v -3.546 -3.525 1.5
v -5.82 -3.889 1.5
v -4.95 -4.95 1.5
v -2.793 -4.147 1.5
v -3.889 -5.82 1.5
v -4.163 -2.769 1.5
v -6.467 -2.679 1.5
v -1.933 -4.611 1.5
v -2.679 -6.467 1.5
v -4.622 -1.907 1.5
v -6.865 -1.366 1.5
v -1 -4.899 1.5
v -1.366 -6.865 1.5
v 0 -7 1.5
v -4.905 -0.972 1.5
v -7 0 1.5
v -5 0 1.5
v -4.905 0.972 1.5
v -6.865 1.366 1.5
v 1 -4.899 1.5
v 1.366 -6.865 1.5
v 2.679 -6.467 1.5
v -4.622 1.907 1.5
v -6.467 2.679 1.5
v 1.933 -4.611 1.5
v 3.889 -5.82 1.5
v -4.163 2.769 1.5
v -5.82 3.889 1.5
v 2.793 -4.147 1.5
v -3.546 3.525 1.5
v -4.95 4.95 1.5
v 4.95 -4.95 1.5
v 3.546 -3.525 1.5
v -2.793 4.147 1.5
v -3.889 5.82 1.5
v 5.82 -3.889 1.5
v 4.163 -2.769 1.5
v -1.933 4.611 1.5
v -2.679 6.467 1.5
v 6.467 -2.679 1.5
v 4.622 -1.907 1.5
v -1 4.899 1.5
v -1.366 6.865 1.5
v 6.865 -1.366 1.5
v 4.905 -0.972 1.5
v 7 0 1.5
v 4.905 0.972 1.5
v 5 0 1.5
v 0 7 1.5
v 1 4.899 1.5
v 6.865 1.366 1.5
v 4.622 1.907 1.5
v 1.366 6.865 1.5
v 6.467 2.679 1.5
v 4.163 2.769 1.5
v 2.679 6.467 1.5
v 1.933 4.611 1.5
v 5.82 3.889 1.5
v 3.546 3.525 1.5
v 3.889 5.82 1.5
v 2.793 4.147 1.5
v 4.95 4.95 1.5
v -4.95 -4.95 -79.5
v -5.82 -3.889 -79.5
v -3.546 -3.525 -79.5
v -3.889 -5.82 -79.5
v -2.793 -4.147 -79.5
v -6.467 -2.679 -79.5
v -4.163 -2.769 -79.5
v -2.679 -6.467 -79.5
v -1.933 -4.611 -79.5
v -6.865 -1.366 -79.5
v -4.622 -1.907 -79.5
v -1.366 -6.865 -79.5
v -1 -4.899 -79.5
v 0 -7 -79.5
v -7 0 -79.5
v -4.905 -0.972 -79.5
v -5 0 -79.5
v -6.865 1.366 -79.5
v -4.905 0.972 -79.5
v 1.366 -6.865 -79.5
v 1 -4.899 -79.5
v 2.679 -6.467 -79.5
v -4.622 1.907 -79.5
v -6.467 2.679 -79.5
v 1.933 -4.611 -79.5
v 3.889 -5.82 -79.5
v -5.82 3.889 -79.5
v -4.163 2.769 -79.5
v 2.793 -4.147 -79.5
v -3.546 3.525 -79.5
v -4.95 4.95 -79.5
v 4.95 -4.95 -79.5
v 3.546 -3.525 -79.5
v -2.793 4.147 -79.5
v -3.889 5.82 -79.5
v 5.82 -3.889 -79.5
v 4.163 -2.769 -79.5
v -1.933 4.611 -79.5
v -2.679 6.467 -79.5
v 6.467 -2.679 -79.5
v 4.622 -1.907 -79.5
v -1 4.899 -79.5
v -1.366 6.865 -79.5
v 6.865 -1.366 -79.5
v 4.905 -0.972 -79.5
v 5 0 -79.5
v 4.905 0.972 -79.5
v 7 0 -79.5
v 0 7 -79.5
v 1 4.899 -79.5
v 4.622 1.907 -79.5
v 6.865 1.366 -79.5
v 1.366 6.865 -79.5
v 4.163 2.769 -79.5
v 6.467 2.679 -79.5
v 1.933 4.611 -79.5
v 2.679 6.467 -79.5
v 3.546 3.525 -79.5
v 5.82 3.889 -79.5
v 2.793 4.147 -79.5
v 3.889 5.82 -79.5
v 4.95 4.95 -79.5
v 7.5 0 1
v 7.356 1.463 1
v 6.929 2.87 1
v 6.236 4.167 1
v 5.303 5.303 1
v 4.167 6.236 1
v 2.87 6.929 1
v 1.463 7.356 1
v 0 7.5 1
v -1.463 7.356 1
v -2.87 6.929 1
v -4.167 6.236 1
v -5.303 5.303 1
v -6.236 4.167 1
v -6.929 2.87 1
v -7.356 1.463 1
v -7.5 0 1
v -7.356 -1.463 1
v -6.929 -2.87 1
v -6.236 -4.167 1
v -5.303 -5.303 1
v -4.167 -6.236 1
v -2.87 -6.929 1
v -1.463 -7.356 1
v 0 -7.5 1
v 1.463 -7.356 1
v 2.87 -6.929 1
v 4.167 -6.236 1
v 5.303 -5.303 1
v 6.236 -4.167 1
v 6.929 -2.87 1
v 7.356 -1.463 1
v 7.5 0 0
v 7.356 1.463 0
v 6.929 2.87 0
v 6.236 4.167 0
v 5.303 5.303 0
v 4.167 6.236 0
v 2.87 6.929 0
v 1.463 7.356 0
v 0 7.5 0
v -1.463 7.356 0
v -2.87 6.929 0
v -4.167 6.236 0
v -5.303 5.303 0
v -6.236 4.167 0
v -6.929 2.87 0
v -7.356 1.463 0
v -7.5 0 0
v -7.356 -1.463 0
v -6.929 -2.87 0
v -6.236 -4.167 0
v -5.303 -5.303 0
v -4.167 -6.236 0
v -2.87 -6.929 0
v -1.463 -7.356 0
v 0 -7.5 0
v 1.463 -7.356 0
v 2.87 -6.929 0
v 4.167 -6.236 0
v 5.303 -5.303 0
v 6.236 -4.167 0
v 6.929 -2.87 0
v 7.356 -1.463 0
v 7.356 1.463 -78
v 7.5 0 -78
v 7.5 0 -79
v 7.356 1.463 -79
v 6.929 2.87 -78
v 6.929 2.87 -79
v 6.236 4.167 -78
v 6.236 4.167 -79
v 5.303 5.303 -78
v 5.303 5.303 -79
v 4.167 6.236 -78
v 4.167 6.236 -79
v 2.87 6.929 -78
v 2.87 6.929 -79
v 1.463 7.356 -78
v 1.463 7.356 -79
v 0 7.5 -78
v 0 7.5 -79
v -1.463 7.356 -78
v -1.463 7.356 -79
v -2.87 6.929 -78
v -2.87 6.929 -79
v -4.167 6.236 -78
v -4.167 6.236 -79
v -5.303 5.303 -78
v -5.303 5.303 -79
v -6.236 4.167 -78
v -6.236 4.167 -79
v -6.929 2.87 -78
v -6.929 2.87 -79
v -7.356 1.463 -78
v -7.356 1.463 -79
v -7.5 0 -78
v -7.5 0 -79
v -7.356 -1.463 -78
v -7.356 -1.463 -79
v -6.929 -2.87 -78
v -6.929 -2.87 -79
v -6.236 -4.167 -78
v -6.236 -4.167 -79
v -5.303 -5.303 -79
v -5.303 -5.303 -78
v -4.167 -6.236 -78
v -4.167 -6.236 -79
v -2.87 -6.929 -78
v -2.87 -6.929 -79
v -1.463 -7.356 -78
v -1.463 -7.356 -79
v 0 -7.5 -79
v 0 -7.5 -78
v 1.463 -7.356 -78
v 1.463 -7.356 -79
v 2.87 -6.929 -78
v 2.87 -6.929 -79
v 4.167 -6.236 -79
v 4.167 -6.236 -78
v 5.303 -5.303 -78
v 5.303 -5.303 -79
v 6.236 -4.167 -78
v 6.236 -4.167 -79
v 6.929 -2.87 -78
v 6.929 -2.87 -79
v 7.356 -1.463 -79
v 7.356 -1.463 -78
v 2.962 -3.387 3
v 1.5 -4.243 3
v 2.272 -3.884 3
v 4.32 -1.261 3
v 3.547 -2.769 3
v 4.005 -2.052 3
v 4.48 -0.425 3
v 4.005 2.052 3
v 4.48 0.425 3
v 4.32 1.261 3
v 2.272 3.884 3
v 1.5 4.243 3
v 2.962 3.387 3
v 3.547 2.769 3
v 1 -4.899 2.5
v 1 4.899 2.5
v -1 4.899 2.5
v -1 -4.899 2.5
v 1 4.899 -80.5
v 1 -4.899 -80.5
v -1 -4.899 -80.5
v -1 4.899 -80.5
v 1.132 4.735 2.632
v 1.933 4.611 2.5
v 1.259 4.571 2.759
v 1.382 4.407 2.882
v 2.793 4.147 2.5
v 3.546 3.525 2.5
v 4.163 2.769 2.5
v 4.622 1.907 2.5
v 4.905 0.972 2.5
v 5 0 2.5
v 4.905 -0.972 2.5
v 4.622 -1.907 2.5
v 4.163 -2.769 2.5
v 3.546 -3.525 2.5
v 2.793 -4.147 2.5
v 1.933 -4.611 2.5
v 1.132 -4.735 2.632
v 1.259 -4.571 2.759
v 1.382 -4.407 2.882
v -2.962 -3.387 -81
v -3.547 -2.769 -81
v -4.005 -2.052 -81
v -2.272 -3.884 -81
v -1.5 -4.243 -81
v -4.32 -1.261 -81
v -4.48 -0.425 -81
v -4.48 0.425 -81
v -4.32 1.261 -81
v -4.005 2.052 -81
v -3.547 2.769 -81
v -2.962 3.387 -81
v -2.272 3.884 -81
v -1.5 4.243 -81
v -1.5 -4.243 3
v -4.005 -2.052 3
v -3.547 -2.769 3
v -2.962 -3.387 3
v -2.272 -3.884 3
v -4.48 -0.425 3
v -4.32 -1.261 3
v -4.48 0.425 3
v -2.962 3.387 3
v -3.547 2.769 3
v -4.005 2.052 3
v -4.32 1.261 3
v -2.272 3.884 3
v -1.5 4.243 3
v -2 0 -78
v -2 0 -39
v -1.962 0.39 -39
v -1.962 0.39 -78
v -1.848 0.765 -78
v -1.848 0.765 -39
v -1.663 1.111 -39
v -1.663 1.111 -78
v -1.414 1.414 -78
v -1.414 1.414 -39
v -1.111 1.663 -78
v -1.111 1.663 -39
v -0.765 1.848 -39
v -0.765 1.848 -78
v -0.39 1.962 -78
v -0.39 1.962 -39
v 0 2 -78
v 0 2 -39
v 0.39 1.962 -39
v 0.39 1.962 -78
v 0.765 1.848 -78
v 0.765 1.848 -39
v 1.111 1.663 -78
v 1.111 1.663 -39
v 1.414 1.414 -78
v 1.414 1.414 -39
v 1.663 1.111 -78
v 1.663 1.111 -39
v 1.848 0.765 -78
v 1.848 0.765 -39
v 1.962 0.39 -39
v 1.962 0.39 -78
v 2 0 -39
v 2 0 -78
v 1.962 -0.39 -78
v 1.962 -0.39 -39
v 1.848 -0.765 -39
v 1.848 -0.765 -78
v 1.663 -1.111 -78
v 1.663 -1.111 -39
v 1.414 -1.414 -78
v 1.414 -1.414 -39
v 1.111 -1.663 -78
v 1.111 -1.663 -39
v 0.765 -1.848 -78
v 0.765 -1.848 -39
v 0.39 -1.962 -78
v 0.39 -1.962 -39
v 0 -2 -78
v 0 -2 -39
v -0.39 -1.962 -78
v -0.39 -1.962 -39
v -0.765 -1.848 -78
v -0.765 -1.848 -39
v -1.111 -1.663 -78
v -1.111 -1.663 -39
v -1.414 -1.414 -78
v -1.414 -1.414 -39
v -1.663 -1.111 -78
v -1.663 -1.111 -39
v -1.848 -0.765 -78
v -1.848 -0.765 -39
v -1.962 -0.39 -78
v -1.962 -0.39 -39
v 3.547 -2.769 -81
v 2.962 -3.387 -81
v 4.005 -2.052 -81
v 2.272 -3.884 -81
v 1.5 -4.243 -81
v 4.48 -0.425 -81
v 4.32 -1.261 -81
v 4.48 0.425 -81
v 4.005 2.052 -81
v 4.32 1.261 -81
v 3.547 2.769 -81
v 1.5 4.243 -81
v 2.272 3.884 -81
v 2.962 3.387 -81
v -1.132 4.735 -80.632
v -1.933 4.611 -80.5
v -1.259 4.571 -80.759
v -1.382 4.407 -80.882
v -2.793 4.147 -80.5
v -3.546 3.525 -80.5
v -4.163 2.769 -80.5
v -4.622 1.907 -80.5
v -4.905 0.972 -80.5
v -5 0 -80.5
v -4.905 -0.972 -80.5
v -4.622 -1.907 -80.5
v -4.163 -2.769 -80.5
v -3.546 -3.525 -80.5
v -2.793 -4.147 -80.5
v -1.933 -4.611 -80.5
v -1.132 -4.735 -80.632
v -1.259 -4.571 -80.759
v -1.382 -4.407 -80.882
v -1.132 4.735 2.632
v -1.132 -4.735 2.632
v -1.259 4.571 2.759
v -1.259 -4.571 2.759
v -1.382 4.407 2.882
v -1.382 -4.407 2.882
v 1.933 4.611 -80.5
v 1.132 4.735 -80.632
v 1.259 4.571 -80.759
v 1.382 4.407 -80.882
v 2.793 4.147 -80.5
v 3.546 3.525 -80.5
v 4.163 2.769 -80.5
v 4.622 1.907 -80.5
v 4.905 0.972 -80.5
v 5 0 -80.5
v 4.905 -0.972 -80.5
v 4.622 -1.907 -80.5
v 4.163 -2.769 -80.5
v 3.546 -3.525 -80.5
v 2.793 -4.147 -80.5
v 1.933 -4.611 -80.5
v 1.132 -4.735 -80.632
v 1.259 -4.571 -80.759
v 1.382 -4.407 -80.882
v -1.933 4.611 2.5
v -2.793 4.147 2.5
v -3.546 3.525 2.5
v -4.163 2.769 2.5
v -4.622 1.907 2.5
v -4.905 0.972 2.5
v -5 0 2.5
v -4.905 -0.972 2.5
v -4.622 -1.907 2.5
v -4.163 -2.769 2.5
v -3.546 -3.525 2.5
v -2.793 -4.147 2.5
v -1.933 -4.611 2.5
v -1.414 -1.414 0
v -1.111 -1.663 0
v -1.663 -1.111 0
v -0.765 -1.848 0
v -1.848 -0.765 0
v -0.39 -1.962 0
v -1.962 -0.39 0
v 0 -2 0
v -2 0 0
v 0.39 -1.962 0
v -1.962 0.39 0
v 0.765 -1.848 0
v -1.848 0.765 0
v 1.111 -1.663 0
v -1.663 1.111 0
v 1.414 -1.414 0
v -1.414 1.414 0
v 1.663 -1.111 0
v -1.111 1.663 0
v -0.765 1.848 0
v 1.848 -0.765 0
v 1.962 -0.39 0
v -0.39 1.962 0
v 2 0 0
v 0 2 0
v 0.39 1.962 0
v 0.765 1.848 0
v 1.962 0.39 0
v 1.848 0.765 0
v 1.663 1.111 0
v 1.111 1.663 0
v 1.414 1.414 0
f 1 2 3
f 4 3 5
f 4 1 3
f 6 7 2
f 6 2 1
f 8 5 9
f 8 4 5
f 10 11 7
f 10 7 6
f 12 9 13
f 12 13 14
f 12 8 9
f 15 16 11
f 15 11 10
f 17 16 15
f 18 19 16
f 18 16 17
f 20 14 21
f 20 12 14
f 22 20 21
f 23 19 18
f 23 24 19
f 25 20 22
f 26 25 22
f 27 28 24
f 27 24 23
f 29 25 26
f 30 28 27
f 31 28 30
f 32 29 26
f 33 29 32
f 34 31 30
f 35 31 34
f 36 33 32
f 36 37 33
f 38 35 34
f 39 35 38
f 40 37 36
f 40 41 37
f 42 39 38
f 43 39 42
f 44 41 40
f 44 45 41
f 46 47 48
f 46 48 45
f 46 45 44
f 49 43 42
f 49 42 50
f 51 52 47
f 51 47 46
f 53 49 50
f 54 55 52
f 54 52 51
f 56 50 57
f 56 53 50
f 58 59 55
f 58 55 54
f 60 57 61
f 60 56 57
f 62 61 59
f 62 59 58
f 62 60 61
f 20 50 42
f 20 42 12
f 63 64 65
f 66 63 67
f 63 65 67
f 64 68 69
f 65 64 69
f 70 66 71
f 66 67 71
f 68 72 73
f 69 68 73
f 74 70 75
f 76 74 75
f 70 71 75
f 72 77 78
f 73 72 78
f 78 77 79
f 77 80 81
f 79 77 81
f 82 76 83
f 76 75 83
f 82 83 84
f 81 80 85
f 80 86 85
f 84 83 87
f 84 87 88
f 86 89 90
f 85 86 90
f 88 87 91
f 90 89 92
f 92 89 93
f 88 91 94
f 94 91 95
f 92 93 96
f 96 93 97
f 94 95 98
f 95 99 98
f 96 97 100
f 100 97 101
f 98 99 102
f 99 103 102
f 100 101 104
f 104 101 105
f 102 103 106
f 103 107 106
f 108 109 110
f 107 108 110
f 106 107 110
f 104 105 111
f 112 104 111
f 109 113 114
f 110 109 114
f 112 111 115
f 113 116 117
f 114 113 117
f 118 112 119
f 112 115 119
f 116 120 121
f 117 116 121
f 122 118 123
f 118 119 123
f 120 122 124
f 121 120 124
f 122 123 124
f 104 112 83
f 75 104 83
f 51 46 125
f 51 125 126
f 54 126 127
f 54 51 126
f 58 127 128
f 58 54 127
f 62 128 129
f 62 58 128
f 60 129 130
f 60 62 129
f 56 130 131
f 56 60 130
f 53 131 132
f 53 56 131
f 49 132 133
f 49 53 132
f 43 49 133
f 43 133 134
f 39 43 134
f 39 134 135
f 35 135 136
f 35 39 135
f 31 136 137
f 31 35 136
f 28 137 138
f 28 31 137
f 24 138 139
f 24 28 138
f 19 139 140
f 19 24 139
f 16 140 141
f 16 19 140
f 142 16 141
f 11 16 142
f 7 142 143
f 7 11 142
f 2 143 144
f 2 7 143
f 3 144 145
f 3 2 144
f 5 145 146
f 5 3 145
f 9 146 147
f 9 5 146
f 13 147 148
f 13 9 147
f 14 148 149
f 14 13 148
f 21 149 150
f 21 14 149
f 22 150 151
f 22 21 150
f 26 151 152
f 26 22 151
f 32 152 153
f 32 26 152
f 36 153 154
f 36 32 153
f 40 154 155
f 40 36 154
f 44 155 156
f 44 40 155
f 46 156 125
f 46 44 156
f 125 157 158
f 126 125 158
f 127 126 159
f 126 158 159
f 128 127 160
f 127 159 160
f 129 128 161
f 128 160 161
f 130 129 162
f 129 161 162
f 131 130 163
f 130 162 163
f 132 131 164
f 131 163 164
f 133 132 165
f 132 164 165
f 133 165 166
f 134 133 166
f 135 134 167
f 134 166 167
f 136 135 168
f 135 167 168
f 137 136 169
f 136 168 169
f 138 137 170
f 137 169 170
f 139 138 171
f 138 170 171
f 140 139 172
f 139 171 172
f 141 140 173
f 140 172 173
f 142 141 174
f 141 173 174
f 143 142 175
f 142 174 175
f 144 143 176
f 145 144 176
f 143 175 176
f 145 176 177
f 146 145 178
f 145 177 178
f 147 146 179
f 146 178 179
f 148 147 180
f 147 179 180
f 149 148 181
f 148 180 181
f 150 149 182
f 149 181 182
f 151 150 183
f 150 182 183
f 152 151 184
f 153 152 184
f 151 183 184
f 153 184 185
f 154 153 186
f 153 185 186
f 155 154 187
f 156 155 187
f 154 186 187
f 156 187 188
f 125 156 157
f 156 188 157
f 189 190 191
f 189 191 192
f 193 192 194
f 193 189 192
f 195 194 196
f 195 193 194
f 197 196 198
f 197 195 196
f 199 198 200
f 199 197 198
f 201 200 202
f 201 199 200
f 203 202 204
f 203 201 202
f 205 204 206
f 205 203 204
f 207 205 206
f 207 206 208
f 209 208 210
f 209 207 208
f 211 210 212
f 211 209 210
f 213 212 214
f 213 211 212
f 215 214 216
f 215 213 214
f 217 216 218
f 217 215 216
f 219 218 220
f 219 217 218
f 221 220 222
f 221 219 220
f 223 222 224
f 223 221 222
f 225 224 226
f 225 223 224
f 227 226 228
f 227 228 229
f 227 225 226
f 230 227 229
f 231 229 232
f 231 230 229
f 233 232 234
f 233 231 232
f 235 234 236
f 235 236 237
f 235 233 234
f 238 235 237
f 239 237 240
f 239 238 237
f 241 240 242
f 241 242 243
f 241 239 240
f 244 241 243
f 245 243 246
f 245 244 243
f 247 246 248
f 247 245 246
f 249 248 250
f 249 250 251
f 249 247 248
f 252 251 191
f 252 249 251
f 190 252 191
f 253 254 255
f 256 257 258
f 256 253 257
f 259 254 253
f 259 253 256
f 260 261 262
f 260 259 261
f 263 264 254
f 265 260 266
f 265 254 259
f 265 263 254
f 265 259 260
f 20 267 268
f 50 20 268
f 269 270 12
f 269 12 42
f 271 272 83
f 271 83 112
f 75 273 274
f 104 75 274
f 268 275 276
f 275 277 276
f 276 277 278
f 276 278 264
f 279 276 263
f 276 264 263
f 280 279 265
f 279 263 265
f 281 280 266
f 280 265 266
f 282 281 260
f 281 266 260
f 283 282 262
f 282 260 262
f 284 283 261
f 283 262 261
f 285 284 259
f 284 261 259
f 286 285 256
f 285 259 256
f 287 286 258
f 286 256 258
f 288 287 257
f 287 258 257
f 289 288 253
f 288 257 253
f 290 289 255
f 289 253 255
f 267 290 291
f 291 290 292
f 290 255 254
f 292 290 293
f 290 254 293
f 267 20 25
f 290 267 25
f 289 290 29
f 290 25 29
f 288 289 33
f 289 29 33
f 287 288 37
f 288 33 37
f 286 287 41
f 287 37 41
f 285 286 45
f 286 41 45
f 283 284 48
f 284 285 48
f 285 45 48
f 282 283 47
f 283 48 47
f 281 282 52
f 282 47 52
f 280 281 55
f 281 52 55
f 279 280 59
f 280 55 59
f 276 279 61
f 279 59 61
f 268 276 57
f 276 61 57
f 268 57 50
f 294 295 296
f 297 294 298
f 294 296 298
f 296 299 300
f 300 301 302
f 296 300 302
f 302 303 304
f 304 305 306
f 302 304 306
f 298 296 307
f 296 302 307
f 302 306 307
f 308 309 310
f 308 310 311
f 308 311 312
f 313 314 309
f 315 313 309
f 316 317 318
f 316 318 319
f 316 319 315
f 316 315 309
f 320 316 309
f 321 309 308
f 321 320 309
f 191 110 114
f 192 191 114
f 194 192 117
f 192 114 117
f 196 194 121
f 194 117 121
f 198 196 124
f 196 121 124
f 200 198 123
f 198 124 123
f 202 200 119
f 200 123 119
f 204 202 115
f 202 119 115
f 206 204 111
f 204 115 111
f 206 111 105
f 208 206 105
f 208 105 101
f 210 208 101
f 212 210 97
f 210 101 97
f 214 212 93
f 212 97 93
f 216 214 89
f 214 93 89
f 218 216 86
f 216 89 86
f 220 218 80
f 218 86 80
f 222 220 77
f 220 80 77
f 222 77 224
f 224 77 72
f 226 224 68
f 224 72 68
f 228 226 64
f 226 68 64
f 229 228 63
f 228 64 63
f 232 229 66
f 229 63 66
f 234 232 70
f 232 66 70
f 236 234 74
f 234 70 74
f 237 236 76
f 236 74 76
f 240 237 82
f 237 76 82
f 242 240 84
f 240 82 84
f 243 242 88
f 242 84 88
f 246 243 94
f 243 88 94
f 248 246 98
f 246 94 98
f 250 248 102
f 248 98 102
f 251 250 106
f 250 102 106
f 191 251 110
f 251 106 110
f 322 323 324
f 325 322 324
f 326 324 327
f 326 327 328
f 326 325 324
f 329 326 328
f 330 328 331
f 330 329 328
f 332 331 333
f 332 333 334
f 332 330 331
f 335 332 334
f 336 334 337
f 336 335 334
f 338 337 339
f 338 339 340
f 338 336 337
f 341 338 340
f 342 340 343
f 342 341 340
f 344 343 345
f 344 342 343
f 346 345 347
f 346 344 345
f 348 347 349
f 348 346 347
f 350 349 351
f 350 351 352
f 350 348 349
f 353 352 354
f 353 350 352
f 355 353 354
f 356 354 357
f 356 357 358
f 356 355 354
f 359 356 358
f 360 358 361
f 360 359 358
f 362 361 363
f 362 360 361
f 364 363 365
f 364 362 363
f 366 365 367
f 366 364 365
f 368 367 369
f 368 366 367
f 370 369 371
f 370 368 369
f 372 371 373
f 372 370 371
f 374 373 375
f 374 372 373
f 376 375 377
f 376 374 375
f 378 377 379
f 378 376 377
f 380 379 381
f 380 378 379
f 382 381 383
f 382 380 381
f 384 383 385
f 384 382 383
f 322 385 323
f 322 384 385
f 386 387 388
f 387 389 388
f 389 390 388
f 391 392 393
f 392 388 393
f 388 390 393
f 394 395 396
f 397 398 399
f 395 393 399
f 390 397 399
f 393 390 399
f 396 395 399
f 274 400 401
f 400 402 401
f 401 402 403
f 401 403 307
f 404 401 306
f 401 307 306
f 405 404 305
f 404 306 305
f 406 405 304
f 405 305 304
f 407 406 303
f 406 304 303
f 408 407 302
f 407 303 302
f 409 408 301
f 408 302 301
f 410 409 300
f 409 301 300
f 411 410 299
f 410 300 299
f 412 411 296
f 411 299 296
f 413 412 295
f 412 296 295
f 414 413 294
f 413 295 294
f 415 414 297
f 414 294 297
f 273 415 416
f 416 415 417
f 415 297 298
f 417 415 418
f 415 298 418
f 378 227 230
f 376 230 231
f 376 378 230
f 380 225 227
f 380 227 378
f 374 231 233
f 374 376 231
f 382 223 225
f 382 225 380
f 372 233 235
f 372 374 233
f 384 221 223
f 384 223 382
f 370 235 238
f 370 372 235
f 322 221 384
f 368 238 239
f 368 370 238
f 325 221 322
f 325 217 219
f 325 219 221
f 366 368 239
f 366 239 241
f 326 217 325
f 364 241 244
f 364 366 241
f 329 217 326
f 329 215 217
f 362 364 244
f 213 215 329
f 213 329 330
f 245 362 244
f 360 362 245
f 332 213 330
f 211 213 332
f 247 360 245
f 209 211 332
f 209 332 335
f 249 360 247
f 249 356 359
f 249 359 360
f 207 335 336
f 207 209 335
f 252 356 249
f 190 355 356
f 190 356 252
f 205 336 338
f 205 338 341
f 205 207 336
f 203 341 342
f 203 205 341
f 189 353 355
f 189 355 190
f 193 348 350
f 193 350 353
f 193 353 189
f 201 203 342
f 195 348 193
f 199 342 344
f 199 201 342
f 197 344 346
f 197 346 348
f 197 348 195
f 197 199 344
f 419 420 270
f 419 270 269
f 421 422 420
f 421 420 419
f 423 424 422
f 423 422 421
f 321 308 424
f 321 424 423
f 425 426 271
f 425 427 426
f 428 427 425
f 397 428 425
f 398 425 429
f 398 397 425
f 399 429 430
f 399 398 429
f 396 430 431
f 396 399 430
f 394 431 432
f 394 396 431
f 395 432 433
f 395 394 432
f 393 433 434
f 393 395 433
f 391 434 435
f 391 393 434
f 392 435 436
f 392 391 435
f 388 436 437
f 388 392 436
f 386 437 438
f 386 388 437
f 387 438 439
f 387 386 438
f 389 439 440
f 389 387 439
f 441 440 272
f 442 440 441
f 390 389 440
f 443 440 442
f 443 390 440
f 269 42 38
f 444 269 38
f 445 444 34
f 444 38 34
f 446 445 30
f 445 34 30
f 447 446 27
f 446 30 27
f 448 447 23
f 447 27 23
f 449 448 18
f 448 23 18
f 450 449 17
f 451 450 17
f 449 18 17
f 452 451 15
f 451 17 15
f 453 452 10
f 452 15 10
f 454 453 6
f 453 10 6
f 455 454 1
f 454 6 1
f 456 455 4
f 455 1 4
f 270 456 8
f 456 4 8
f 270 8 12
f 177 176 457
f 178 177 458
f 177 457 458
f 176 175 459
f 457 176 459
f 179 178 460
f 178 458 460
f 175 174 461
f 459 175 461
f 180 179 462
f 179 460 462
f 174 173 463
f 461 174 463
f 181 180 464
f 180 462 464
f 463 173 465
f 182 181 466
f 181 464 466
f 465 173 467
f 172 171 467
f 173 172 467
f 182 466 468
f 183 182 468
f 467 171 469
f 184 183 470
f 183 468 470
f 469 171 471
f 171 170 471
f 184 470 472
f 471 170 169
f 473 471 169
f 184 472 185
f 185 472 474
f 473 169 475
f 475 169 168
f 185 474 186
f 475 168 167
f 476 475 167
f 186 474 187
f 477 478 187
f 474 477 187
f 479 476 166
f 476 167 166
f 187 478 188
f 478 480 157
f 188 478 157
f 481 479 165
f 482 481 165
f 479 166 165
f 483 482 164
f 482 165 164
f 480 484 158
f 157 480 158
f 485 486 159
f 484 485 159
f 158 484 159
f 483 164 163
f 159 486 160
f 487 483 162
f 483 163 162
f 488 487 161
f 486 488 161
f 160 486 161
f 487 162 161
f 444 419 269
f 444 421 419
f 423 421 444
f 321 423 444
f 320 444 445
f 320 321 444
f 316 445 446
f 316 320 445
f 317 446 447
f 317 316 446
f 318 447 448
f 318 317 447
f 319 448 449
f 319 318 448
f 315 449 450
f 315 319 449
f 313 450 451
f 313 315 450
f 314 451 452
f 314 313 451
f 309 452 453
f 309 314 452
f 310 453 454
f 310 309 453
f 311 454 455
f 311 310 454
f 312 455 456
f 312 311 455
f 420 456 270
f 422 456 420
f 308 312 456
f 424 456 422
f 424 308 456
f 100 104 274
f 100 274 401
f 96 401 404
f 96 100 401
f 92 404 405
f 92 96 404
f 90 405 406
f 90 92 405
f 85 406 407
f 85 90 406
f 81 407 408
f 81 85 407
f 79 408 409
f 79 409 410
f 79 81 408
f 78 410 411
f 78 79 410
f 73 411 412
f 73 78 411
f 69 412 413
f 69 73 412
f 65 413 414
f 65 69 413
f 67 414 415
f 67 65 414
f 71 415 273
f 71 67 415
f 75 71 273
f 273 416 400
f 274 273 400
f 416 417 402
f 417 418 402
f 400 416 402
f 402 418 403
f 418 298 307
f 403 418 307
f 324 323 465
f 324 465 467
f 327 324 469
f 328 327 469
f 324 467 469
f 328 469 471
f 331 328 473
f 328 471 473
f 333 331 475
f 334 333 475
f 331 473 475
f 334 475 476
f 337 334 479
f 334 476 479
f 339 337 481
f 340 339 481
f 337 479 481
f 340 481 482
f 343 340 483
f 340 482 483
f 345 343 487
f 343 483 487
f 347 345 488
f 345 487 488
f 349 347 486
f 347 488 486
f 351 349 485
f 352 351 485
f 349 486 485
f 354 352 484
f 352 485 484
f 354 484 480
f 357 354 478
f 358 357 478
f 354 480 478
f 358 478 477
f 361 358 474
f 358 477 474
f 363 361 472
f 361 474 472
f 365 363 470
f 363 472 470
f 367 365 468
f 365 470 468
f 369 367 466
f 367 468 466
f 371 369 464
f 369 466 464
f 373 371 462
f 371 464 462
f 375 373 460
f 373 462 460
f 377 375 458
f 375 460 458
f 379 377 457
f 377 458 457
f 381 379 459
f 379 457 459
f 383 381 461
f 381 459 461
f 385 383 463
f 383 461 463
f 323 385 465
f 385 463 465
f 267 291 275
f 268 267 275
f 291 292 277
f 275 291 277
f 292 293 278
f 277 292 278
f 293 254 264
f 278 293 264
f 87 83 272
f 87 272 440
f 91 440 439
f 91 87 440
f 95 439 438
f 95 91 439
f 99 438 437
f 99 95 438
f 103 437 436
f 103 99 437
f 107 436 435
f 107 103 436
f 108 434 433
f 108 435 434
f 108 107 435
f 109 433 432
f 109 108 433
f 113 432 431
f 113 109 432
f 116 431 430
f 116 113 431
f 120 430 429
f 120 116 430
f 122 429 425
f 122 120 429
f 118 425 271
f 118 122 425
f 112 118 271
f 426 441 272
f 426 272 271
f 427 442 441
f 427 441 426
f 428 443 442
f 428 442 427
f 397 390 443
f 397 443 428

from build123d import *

# Parameters (mm, degrees)
SKETCH1_R           = 7.5
BOSS_EXTRUDE1_DEPTH = 1.5
SKETCH2_R           = 5
BOSS_EXTRUDE2_DEPTH = 1.5
SKETCH3_R           = 2
BOSS_EXTRUDE3_DEPTH = 39
SKETCH4_W           = 2
SKETCH4_H           = 12
CUT_EXTRUDE1_DEPTH  = 1.5
CHAMFER1_SIZE       = 0.5


with BuildPart() as part:
    # Sketch1 → Boss-Extrude1 (new body)
    with BuildSketch(Plane.XY):
        Circle(SKETCH1_R)
    extrude(amount=BOSS_EXTRUDE1_DEPTH)

    # Sketch2 → Boss-Extrude2 (add)
    with BuildSketch(Plane.XY.offset(1.5)):
        Circle(SKETCH2_R)
    extrude(amount=BOSS_EXTRUDE2_DEPTH)

    # Sketch3 → Boss-Extrude3 (add)
    with BuildSketch(Plane(origin=(0, 0, 0), x_dir=(-1, 0, 0), z_dir=(0, 0, -1))):
        Circle(SKETCH3_R)
    extrude(amount=BOSS_EXTRUDE3_DEPTH)

    # Sketch4 → Cut-Extrude1 (cut)
    with BuildSketch(Plane.XY.offset(3)):
        Rectangle(SKETCH4_W, SKETCH4_H)
    extrude(amount=-CUT_EXTRUDE1_DEPTH, mode=Mode.SUBTRACT)

    # Mirror1: part across plane


with BuildPart() as part_1:
    add(part.part)
    add(part.part.mirror(Plane(origin=(0, 0, -39), x_dir=(1, 0, 0), z_dir=(0, 0, -1))))

    # Chamfer1
    chamfer1_edges = [part_1.edges().sort_by_distance(p)[0] for p in [
        (-5, 0, 3),
        (5, 0, 3),
        (-1, 0, 3),
        (1, 0, 3),
        (-7.5, 0, 1.5),
        (5, 0, -81),
        (1, 0, -81),
        (-7.5, 0, -79.5),
        (-5, 0, -81),
        (-1, 0, -81),
    ]]
    chamfer(chamfer1_edges, length=CHAMFER1_SIZE)


solid = part_1.part
